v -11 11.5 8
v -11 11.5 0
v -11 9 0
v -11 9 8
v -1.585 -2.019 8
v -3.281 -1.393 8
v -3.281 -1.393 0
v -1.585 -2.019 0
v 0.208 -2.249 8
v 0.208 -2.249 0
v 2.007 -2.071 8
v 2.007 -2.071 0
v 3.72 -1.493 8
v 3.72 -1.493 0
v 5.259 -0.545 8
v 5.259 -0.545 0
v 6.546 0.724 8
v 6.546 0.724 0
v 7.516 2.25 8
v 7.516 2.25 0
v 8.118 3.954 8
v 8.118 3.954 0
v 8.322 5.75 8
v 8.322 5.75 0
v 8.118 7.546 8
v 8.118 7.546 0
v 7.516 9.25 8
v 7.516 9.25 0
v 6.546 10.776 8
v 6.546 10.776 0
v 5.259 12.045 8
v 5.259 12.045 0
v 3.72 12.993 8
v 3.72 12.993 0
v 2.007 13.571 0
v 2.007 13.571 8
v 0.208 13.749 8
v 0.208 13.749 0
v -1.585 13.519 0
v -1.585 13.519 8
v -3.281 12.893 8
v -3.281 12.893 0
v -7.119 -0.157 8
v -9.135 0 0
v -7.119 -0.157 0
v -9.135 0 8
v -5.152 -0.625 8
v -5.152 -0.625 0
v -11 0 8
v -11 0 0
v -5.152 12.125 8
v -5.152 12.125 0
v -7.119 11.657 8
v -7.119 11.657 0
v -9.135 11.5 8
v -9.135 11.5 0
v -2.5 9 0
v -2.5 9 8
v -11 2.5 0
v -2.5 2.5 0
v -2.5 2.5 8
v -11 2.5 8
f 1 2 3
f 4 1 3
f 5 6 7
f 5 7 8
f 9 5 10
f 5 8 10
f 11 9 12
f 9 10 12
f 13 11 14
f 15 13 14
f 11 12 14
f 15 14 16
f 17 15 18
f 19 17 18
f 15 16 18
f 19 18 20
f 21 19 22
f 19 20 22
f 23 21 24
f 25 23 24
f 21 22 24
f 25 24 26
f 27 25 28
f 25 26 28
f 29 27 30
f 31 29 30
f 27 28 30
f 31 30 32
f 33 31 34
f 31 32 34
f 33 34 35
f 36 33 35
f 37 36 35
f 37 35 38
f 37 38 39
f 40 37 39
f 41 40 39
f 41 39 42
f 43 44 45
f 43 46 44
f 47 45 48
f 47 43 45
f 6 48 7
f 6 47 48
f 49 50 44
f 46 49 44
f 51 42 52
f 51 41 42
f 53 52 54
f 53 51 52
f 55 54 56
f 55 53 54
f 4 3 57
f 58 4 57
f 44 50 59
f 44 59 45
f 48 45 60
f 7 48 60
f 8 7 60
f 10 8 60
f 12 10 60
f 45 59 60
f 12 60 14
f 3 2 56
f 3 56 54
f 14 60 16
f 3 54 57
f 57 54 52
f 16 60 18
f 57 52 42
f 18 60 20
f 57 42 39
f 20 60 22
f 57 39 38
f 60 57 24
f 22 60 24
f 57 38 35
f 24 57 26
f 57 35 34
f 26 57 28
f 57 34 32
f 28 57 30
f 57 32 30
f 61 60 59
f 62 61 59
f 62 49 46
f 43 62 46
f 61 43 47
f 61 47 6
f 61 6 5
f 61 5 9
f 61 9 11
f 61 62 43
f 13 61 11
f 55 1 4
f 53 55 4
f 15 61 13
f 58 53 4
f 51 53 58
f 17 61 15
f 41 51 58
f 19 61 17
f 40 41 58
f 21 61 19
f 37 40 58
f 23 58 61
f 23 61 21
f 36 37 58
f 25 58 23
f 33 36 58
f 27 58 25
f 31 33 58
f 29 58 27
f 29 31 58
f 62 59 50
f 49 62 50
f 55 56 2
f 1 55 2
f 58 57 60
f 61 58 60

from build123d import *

# Parameters (mm, degrees)
F1_DEPTH = 8
F2_R     = 13


with BuildPart() as f1:
    # F0 (on Top) → F1 (new body)
    with BuildSketch(Plane.XY):
        with BuildLine():
            Line((-11, 0), (-5.240036, 0))
            ThreePointArc((-5.240036, 0), (8.322113, 5.75), (-5.240036, 11.5))
            Line((-5.240036, 11.5), (-11, 11.5))
            Line((-11, 11.5), (-11, 9))
            Line((-11, 9), (-2.5, 9))
            Line((-2.5, 9), (-2.5, 2.5))
            Line((-2.5, 2.5), (-11, 2.5))
            Line((-11, 2.5), (-11, 0))
        make_face()
    extrude(amount=F1_DEPTH)

    # F2
    f2_edges = [f1.edges().sort_by_distance(p)[0] for p in [
        (-5.240036, 0, 4),
        (-5.240036, 11.5, 4),
    ]]
    fillet(f2_edges, radius=F2_R)


solid = f1.part
